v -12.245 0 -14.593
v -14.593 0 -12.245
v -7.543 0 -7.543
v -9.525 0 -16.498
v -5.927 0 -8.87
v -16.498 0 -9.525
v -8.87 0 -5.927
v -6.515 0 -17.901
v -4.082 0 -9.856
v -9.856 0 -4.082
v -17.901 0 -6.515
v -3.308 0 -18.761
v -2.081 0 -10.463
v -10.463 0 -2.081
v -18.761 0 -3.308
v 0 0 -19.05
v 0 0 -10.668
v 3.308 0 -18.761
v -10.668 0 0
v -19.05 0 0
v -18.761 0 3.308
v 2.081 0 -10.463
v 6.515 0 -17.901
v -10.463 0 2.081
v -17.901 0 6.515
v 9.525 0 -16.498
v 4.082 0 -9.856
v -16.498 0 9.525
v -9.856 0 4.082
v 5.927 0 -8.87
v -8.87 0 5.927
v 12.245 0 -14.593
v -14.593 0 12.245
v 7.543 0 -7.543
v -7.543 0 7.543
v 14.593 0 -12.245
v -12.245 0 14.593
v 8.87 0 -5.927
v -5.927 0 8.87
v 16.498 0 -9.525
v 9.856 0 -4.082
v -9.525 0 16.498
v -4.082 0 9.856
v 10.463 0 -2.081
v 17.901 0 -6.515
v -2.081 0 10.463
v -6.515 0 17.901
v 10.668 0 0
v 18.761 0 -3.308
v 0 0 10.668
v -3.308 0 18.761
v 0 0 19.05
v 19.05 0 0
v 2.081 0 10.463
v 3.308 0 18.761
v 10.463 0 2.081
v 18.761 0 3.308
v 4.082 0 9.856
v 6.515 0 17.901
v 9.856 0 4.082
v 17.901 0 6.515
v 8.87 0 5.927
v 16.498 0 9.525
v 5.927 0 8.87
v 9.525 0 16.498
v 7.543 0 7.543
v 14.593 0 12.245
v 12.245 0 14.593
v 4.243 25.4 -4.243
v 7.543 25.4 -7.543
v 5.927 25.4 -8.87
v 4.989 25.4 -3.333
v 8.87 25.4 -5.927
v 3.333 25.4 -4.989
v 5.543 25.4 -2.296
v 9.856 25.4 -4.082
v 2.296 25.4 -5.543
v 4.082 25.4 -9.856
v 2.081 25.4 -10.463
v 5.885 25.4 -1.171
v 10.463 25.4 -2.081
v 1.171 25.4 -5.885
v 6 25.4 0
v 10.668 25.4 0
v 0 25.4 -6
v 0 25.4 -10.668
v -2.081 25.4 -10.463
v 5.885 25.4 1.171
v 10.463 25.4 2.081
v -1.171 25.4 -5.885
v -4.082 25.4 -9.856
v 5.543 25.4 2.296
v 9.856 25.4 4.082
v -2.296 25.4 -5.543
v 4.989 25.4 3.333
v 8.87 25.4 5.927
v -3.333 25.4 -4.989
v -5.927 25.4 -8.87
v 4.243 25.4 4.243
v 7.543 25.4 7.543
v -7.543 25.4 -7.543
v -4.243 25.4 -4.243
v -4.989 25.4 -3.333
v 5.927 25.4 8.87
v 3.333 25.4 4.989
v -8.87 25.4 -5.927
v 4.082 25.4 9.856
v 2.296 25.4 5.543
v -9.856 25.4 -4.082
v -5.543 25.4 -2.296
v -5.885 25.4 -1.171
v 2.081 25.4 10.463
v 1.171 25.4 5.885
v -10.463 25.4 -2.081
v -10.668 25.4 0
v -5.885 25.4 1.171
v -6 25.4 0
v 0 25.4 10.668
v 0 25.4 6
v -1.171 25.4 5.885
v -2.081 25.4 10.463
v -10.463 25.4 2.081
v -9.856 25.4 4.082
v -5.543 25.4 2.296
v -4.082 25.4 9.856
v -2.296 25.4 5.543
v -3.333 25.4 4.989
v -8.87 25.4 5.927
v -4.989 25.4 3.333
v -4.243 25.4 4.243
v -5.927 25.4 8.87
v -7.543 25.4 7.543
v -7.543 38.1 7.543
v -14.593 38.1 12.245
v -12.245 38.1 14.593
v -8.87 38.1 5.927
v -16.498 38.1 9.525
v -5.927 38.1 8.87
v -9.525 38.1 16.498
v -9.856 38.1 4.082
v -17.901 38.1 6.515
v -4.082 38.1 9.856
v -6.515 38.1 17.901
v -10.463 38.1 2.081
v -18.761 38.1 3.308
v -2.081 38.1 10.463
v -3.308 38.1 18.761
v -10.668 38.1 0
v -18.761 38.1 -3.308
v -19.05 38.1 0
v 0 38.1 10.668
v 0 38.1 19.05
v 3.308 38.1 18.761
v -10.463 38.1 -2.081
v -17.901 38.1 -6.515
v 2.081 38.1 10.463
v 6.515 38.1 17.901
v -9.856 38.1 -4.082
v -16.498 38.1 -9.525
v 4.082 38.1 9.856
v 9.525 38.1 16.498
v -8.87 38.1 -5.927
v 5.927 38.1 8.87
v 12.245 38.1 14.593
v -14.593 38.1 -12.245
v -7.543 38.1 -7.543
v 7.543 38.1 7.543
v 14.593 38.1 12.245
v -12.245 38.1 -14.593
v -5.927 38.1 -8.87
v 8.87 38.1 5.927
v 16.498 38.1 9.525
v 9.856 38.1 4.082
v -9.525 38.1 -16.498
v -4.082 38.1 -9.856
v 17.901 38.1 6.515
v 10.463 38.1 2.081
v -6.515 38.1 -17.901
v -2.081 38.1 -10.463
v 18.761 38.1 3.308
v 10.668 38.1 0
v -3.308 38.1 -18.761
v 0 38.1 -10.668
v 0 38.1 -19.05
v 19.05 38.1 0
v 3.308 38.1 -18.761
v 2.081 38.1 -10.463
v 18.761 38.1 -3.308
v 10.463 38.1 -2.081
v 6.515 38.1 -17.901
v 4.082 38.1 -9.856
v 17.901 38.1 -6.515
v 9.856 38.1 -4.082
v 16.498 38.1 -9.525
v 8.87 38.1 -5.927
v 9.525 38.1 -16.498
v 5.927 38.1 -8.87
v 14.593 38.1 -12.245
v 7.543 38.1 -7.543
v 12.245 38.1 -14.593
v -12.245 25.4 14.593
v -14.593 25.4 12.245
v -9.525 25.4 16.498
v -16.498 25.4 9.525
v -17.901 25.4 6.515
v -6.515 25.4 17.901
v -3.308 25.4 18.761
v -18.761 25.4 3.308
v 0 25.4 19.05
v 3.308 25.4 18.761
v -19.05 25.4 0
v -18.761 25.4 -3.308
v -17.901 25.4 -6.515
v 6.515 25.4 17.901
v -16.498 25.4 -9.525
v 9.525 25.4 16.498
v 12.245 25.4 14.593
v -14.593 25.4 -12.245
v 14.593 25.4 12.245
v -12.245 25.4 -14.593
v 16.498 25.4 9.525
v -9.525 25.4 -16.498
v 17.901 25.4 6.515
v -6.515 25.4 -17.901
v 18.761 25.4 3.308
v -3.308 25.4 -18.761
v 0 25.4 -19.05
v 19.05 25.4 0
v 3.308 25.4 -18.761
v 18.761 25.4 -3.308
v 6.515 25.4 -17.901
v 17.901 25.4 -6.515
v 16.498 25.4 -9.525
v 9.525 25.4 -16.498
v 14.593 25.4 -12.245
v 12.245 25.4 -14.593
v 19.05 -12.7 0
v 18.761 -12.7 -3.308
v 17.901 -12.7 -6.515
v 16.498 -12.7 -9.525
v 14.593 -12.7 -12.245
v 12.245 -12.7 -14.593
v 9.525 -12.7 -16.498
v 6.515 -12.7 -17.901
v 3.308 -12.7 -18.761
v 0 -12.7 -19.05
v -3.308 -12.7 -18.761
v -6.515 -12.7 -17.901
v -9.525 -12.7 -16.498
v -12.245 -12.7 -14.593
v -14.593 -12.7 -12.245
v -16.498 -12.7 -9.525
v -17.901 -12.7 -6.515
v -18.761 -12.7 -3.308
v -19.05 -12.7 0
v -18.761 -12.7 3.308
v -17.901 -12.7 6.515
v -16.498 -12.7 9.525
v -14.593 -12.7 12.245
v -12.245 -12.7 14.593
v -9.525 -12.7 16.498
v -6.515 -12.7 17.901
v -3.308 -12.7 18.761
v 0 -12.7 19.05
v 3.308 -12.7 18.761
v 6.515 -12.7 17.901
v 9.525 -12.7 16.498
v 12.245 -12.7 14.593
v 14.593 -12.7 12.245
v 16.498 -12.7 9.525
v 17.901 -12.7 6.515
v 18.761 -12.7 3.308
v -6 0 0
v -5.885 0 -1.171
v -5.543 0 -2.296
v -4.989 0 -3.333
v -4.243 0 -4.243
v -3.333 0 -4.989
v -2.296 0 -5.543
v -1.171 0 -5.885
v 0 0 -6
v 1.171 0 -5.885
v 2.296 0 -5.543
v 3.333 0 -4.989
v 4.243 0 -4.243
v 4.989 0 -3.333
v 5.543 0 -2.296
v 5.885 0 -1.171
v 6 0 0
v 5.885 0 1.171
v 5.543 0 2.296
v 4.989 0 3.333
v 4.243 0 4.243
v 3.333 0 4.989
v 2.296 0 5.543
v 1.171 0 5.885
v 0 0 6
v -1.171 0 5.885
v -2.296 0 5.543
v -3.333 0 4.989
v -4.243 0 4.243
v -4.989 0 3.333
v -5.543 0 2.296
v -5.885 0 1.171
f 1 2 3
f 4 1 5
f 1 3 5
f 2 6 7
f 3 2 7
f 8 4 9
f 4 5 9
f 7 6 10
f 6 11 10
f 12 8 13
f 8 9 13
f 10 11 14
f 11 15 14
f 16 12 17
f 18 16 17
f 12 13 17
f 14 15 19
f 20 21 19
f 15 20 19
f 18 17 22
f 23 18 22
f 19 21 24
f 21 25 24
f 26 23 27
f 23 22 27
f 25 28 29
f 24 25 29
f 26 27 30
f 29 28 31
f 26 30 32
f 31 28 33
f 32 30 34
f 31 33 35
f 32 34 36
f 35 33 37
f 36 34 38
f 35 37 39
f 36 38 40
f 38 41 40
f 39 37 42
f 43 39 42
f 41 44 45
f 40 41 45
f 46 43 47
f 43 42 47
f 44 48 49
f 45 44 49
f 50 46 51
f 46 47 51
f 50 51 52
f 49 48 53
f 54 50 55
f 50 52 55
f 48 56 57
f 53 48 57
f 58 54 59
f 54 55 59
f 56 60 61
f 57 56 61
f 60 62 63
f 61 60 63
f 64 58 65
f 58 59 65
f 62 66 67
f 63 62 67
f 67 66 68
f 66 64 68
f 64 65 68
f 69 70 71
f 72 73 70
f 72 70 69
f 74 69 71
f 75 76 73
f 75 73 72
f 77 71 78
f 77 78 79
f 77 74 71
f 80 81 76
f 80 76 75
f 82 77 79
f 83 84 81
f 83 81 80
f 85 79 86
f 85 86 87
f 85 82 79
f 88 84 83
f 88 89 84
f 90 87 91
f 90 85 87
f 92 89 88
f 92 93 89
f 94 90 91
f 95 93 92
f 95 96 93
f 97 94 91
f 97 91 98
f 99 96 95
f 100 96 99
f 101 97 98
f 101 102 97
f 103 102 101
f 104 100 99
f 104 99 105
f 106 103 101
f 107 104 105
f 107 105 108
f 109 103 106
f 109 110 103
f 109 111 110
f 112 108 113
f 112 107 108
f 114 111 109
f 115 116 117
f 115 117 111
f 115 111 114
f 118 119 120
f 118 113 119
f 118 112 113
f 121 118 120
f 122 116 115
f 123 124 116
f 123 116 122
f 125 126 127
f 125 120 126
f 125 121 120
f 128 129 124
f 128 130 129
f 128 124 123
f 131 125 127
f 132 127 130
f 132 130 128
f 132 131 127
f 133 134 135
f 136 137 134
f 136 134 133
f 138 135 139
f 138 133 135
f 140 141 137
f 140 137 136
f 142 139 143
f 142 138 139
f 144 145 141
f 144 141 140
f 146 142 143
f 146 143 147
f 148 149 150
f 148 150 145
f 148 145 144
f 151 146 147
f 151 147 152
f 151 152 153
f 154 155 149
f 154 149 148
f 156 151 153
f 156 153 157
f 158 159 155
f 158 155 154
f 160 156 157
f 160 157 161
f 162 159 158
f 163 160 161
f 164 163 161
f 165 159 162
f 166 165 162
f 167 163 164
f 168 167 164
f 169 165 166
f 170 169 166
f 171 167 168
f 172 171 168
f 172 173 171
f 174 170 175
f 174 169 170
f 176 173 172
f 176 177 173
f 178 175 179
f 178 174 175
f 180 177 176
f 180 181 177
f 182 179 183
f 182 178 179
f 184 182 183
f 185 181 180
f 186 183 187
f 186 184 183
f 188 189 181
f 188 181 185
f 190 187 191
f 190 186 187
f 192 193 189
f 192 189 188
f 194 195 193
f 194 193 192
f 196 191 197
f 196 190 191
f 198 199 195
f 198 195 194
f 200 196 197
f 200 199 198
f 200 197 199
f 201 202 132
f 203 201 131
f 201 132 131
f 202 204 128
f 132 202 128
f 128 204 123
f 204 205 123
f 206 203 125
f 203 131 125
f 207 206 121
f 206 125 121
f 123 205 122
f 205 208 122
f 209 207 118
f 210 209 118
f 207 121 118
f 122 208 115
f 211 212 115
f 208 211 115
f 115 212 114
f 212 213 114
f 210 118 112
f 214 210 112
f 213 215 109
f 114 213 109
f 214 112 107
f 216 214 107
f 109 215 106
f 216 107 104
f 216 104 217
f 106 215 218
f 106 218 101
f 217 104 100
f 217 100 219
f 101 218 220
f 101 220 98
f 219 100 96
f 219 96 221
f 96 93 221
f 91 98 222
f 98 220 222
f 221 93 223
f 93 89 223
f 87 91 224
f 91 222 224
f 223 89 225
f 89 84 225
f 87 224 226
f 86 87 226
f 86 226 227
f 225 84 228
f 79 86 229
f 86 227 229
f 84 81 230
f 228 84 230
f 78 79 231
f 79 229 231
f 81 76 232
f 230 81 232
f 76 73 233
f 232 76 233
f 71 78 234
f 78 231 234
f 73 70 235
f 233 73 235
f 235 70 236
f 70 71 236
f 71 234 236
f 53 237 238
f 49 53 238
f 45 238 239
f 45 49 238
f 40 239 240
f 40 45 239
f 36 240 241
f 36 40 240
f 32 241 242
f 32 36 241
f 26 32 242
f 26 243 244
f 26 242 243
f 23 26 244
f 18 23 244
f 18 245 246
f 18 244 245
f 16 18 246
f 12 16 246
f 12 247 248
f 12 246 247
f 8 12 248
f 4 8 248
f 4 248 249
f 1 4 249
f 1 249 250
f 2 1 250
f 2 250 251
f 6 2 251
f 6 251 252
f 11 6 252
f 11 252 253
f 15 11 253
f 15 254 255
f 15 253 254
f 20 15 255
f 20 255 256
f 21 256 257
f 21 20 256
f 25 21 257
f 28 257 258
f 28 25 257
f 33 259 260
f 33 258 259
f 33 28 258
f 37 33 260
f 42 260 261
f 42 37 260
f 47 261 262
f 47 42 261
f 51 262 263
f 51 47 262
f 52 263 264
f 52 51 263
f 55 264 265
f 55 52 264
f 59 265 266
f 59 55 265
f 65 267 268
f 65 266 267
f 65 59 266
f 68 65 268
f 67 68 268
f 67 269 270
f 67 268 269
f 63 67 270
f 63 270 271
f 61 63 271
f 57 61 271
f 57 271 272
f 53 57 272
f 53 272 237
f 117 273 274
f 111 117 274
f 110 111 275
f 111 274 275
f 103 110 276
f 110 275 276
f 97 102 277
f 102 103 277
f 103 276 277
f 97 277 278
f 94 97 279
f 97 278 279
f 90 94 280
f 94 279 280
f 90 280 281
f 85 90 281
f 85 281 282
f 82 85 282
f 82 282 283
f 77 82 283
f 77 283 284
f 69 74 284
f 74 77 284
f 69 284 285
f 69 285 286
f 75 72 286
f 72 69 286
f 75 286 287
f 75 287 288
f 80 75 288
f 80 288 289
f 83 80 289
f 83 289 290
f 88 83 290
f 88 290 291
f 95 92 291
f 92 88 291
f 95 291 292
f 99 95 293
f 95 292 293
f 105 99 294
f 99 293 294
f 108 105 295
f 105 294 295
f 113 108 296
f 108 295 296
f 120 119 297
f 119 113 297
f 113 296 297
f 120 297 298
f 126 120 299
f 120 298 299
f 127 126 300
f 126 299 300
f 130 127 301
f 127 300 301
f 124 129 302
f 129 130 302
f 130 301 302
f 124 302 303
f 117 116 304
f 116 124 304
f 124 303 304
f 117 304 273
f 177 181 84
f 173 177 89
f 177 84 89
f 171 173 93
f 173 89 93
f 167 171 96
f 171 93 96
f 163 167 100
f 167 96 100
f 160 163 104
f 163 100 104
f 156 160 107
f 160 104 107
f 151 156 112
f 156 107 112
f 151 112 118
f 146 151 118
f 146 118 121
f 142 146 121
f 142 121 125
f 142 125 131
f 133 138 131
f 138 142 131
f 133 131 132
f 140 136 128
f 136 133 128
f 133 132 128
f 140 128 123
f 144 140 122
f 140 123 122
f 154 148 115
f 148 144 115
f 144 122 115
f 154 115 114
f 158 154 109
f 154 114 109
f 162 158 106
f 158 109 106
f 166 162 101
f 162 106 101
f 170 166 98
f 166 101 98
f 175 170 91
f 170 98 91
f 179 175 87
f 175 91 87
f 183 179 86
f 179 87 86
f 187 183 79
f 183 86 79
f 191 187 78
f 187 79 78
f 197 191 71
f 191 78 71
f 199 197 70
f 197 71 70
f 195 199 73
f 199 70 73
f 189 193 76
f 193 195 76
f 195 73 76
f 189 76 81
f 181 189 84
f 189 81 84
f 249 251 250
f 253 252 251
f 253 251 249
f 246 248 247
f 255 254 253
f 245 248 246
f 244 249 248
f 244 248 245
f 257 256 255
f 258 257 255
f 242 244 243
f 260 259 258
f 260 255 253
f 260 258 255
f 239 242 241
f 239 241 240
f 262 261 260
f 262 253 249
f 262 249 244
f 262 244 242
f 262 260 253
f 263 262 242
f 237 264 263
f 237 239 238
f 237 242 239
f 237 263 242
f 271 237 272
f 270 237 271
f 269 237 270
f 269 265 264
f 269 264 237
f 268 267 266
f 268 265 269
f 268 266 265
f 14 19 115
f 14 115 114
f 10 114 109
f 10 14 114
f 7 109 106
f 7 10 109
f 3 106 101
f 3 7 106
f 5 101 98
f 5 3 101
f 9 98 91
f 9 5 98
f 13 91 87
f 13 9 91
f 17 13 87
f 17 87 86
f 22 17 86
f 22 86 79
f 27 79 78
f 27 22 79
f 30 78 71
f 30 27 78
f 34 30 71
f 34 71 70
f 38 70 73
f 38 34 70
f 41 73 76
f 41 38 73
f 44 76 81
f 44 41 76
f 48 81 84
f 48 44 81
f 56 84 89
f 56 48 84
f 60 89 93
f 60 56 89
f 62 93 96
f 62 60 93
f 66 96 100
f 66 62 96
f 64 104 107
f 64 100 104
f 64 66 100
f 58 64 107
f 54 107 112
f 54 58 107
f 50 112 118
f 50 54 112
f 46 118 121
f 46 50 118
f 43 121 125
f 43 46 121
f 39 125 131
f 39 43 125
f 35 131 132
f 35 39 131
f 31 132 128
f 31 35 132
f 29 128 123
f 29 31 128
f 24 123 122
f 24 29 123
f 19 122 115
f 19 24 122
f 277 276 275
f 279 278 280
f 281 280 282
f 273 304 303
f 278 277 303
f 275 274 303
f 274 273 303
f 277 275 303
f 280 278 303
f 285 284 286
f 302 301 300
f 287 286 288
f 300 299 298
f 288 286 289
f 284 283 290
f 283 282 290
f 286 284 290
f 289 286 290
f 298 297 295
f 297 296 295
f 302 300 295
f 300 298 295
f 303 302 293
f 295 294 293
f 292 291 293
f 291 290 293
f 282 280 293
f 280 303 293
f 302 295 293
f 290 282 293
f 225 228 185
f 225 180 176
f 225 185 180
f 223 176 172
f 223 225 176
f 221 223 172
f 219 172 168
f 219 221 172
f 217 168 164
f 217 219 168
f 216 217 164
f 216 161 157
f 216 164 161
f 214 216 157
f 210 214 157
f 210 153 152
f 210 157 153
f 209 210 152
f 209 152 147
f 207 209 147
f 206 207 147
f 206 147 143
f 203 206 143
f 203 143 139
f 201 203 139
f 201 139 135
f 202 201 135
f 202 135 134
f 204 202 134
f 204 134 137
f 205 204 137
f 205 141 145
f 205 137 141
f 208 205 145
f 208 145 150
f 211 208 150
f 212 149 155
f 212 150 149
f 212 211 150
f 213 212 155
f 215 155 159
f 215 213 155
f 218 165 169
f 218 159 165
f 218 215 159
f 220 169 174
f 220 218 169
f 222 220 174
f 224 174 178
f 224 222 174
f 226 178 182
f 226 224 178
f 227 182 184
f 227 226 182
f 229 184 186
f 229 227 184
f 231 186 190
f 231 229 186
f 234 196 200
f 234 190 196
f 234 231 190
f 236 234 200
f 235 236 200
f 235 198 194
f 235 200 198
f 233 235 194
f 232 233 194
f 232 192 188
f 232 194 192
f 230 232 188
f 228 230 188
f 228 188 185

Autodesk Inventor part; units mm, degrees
ref_plane "YZ Plane" through (0, 0, 0) normal (1, 0, 0) x (0, 1, 0)
ref_plane "XZ Plane" through (0, 0, 0) normal (0, 1, 0) x (-1, 0, 0)
ref_plane "XY Plane" through (0, 0, 0) normal (0, 0, 1) x (1, 0, 0)
sketch "Sketch1" plane through (0, 0, 0) normal (0, 1, 0) x (-1, 0, 0)
  circle A0 centre (0, 0) radius 6
  circle A1 centre (0, 0) radius 10.668
  dimension "d0" = 12
  dimension "d1" = 21.336
  dimension "d4" = 4.668
extrude "Extrusion1" add sketch "Sketch1" along normal blind 25.4
sketch "Sketch2" plane through (0, 25.4, 0) normal (0, 1, 0) x (1, 0, 0)
  circle A0 centre (0, 0) radius 10.668 projected
  circle A1 centre (0, 0) radius 19.05
  dimension "d5" = 38.1
extrude "Extrusion2" add sketch "Sketch2" along normal blind 12.7
sketch "Sketch3" plane through (0, 0, 0) normal (0, -1, 0) x (1, 0, 0)
  circle A0 centre (0, 0) radius 10.668 projected
  circle A1 centre (0, 0) radius 19.05
  dimension "d8" = 38.1
extrude "Extrusion3" add sketch "Sketch3" along normal blind 12.7 contours A0 | A1
properties part number "winch pipe"
